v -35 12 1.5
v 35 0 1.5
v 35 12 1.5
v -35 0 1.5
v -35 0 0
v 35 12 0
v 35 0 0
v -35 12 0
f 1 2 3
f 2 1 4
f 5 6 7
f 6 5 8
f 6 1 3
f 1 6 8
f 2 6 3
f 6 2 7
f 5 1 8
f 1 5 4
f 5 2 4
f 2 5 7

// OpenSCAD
// 10-well comb for casting agarose gels, printed lying flat
// Units: mm

// ---- Parameters ----
plate_thickness   = 1.5;   // Z thickness of the whole comb
spine_length      = 70;    // X length of the back bar (spine)
spine_width       = 12;    // Y width of the back bar
teeth_count       = 10;    // number of wells/teeth
teeth_width       = 5.0;   // tooth width along X
teeth_length      = 12;    // tooth length along Y (overlaps spine width)
teeth_gap         = 1.5;   // clear gap between neighbouring teeth
cut_extra         = 0.5;   // overshoot for clean boolean cuts

$fn = 64;

// ---- Derived ----
pitch   = teeth_width + teeth_gap;            // centre-to-centre spacing
x_start = -(teeth_count - 1) * pitch / 2;    // first tooth centre X (row centred)

// ---- Model ----
union() {
    // Back bar (spine)
    translate([-spine_length / 2, 0, 0])
        cube([spine_length, spine_width, plate_thickness]);

    // Teeth hanging in -Y
    for (i = [0 : teeth_count - 1]) {
        translate([x_start + i * pitch - teeth_width / 2,
                   teeth_length - cut_extra,
                   0])
            cube([teeth_width, cut_extra, plate_thickness]);
    }
}
